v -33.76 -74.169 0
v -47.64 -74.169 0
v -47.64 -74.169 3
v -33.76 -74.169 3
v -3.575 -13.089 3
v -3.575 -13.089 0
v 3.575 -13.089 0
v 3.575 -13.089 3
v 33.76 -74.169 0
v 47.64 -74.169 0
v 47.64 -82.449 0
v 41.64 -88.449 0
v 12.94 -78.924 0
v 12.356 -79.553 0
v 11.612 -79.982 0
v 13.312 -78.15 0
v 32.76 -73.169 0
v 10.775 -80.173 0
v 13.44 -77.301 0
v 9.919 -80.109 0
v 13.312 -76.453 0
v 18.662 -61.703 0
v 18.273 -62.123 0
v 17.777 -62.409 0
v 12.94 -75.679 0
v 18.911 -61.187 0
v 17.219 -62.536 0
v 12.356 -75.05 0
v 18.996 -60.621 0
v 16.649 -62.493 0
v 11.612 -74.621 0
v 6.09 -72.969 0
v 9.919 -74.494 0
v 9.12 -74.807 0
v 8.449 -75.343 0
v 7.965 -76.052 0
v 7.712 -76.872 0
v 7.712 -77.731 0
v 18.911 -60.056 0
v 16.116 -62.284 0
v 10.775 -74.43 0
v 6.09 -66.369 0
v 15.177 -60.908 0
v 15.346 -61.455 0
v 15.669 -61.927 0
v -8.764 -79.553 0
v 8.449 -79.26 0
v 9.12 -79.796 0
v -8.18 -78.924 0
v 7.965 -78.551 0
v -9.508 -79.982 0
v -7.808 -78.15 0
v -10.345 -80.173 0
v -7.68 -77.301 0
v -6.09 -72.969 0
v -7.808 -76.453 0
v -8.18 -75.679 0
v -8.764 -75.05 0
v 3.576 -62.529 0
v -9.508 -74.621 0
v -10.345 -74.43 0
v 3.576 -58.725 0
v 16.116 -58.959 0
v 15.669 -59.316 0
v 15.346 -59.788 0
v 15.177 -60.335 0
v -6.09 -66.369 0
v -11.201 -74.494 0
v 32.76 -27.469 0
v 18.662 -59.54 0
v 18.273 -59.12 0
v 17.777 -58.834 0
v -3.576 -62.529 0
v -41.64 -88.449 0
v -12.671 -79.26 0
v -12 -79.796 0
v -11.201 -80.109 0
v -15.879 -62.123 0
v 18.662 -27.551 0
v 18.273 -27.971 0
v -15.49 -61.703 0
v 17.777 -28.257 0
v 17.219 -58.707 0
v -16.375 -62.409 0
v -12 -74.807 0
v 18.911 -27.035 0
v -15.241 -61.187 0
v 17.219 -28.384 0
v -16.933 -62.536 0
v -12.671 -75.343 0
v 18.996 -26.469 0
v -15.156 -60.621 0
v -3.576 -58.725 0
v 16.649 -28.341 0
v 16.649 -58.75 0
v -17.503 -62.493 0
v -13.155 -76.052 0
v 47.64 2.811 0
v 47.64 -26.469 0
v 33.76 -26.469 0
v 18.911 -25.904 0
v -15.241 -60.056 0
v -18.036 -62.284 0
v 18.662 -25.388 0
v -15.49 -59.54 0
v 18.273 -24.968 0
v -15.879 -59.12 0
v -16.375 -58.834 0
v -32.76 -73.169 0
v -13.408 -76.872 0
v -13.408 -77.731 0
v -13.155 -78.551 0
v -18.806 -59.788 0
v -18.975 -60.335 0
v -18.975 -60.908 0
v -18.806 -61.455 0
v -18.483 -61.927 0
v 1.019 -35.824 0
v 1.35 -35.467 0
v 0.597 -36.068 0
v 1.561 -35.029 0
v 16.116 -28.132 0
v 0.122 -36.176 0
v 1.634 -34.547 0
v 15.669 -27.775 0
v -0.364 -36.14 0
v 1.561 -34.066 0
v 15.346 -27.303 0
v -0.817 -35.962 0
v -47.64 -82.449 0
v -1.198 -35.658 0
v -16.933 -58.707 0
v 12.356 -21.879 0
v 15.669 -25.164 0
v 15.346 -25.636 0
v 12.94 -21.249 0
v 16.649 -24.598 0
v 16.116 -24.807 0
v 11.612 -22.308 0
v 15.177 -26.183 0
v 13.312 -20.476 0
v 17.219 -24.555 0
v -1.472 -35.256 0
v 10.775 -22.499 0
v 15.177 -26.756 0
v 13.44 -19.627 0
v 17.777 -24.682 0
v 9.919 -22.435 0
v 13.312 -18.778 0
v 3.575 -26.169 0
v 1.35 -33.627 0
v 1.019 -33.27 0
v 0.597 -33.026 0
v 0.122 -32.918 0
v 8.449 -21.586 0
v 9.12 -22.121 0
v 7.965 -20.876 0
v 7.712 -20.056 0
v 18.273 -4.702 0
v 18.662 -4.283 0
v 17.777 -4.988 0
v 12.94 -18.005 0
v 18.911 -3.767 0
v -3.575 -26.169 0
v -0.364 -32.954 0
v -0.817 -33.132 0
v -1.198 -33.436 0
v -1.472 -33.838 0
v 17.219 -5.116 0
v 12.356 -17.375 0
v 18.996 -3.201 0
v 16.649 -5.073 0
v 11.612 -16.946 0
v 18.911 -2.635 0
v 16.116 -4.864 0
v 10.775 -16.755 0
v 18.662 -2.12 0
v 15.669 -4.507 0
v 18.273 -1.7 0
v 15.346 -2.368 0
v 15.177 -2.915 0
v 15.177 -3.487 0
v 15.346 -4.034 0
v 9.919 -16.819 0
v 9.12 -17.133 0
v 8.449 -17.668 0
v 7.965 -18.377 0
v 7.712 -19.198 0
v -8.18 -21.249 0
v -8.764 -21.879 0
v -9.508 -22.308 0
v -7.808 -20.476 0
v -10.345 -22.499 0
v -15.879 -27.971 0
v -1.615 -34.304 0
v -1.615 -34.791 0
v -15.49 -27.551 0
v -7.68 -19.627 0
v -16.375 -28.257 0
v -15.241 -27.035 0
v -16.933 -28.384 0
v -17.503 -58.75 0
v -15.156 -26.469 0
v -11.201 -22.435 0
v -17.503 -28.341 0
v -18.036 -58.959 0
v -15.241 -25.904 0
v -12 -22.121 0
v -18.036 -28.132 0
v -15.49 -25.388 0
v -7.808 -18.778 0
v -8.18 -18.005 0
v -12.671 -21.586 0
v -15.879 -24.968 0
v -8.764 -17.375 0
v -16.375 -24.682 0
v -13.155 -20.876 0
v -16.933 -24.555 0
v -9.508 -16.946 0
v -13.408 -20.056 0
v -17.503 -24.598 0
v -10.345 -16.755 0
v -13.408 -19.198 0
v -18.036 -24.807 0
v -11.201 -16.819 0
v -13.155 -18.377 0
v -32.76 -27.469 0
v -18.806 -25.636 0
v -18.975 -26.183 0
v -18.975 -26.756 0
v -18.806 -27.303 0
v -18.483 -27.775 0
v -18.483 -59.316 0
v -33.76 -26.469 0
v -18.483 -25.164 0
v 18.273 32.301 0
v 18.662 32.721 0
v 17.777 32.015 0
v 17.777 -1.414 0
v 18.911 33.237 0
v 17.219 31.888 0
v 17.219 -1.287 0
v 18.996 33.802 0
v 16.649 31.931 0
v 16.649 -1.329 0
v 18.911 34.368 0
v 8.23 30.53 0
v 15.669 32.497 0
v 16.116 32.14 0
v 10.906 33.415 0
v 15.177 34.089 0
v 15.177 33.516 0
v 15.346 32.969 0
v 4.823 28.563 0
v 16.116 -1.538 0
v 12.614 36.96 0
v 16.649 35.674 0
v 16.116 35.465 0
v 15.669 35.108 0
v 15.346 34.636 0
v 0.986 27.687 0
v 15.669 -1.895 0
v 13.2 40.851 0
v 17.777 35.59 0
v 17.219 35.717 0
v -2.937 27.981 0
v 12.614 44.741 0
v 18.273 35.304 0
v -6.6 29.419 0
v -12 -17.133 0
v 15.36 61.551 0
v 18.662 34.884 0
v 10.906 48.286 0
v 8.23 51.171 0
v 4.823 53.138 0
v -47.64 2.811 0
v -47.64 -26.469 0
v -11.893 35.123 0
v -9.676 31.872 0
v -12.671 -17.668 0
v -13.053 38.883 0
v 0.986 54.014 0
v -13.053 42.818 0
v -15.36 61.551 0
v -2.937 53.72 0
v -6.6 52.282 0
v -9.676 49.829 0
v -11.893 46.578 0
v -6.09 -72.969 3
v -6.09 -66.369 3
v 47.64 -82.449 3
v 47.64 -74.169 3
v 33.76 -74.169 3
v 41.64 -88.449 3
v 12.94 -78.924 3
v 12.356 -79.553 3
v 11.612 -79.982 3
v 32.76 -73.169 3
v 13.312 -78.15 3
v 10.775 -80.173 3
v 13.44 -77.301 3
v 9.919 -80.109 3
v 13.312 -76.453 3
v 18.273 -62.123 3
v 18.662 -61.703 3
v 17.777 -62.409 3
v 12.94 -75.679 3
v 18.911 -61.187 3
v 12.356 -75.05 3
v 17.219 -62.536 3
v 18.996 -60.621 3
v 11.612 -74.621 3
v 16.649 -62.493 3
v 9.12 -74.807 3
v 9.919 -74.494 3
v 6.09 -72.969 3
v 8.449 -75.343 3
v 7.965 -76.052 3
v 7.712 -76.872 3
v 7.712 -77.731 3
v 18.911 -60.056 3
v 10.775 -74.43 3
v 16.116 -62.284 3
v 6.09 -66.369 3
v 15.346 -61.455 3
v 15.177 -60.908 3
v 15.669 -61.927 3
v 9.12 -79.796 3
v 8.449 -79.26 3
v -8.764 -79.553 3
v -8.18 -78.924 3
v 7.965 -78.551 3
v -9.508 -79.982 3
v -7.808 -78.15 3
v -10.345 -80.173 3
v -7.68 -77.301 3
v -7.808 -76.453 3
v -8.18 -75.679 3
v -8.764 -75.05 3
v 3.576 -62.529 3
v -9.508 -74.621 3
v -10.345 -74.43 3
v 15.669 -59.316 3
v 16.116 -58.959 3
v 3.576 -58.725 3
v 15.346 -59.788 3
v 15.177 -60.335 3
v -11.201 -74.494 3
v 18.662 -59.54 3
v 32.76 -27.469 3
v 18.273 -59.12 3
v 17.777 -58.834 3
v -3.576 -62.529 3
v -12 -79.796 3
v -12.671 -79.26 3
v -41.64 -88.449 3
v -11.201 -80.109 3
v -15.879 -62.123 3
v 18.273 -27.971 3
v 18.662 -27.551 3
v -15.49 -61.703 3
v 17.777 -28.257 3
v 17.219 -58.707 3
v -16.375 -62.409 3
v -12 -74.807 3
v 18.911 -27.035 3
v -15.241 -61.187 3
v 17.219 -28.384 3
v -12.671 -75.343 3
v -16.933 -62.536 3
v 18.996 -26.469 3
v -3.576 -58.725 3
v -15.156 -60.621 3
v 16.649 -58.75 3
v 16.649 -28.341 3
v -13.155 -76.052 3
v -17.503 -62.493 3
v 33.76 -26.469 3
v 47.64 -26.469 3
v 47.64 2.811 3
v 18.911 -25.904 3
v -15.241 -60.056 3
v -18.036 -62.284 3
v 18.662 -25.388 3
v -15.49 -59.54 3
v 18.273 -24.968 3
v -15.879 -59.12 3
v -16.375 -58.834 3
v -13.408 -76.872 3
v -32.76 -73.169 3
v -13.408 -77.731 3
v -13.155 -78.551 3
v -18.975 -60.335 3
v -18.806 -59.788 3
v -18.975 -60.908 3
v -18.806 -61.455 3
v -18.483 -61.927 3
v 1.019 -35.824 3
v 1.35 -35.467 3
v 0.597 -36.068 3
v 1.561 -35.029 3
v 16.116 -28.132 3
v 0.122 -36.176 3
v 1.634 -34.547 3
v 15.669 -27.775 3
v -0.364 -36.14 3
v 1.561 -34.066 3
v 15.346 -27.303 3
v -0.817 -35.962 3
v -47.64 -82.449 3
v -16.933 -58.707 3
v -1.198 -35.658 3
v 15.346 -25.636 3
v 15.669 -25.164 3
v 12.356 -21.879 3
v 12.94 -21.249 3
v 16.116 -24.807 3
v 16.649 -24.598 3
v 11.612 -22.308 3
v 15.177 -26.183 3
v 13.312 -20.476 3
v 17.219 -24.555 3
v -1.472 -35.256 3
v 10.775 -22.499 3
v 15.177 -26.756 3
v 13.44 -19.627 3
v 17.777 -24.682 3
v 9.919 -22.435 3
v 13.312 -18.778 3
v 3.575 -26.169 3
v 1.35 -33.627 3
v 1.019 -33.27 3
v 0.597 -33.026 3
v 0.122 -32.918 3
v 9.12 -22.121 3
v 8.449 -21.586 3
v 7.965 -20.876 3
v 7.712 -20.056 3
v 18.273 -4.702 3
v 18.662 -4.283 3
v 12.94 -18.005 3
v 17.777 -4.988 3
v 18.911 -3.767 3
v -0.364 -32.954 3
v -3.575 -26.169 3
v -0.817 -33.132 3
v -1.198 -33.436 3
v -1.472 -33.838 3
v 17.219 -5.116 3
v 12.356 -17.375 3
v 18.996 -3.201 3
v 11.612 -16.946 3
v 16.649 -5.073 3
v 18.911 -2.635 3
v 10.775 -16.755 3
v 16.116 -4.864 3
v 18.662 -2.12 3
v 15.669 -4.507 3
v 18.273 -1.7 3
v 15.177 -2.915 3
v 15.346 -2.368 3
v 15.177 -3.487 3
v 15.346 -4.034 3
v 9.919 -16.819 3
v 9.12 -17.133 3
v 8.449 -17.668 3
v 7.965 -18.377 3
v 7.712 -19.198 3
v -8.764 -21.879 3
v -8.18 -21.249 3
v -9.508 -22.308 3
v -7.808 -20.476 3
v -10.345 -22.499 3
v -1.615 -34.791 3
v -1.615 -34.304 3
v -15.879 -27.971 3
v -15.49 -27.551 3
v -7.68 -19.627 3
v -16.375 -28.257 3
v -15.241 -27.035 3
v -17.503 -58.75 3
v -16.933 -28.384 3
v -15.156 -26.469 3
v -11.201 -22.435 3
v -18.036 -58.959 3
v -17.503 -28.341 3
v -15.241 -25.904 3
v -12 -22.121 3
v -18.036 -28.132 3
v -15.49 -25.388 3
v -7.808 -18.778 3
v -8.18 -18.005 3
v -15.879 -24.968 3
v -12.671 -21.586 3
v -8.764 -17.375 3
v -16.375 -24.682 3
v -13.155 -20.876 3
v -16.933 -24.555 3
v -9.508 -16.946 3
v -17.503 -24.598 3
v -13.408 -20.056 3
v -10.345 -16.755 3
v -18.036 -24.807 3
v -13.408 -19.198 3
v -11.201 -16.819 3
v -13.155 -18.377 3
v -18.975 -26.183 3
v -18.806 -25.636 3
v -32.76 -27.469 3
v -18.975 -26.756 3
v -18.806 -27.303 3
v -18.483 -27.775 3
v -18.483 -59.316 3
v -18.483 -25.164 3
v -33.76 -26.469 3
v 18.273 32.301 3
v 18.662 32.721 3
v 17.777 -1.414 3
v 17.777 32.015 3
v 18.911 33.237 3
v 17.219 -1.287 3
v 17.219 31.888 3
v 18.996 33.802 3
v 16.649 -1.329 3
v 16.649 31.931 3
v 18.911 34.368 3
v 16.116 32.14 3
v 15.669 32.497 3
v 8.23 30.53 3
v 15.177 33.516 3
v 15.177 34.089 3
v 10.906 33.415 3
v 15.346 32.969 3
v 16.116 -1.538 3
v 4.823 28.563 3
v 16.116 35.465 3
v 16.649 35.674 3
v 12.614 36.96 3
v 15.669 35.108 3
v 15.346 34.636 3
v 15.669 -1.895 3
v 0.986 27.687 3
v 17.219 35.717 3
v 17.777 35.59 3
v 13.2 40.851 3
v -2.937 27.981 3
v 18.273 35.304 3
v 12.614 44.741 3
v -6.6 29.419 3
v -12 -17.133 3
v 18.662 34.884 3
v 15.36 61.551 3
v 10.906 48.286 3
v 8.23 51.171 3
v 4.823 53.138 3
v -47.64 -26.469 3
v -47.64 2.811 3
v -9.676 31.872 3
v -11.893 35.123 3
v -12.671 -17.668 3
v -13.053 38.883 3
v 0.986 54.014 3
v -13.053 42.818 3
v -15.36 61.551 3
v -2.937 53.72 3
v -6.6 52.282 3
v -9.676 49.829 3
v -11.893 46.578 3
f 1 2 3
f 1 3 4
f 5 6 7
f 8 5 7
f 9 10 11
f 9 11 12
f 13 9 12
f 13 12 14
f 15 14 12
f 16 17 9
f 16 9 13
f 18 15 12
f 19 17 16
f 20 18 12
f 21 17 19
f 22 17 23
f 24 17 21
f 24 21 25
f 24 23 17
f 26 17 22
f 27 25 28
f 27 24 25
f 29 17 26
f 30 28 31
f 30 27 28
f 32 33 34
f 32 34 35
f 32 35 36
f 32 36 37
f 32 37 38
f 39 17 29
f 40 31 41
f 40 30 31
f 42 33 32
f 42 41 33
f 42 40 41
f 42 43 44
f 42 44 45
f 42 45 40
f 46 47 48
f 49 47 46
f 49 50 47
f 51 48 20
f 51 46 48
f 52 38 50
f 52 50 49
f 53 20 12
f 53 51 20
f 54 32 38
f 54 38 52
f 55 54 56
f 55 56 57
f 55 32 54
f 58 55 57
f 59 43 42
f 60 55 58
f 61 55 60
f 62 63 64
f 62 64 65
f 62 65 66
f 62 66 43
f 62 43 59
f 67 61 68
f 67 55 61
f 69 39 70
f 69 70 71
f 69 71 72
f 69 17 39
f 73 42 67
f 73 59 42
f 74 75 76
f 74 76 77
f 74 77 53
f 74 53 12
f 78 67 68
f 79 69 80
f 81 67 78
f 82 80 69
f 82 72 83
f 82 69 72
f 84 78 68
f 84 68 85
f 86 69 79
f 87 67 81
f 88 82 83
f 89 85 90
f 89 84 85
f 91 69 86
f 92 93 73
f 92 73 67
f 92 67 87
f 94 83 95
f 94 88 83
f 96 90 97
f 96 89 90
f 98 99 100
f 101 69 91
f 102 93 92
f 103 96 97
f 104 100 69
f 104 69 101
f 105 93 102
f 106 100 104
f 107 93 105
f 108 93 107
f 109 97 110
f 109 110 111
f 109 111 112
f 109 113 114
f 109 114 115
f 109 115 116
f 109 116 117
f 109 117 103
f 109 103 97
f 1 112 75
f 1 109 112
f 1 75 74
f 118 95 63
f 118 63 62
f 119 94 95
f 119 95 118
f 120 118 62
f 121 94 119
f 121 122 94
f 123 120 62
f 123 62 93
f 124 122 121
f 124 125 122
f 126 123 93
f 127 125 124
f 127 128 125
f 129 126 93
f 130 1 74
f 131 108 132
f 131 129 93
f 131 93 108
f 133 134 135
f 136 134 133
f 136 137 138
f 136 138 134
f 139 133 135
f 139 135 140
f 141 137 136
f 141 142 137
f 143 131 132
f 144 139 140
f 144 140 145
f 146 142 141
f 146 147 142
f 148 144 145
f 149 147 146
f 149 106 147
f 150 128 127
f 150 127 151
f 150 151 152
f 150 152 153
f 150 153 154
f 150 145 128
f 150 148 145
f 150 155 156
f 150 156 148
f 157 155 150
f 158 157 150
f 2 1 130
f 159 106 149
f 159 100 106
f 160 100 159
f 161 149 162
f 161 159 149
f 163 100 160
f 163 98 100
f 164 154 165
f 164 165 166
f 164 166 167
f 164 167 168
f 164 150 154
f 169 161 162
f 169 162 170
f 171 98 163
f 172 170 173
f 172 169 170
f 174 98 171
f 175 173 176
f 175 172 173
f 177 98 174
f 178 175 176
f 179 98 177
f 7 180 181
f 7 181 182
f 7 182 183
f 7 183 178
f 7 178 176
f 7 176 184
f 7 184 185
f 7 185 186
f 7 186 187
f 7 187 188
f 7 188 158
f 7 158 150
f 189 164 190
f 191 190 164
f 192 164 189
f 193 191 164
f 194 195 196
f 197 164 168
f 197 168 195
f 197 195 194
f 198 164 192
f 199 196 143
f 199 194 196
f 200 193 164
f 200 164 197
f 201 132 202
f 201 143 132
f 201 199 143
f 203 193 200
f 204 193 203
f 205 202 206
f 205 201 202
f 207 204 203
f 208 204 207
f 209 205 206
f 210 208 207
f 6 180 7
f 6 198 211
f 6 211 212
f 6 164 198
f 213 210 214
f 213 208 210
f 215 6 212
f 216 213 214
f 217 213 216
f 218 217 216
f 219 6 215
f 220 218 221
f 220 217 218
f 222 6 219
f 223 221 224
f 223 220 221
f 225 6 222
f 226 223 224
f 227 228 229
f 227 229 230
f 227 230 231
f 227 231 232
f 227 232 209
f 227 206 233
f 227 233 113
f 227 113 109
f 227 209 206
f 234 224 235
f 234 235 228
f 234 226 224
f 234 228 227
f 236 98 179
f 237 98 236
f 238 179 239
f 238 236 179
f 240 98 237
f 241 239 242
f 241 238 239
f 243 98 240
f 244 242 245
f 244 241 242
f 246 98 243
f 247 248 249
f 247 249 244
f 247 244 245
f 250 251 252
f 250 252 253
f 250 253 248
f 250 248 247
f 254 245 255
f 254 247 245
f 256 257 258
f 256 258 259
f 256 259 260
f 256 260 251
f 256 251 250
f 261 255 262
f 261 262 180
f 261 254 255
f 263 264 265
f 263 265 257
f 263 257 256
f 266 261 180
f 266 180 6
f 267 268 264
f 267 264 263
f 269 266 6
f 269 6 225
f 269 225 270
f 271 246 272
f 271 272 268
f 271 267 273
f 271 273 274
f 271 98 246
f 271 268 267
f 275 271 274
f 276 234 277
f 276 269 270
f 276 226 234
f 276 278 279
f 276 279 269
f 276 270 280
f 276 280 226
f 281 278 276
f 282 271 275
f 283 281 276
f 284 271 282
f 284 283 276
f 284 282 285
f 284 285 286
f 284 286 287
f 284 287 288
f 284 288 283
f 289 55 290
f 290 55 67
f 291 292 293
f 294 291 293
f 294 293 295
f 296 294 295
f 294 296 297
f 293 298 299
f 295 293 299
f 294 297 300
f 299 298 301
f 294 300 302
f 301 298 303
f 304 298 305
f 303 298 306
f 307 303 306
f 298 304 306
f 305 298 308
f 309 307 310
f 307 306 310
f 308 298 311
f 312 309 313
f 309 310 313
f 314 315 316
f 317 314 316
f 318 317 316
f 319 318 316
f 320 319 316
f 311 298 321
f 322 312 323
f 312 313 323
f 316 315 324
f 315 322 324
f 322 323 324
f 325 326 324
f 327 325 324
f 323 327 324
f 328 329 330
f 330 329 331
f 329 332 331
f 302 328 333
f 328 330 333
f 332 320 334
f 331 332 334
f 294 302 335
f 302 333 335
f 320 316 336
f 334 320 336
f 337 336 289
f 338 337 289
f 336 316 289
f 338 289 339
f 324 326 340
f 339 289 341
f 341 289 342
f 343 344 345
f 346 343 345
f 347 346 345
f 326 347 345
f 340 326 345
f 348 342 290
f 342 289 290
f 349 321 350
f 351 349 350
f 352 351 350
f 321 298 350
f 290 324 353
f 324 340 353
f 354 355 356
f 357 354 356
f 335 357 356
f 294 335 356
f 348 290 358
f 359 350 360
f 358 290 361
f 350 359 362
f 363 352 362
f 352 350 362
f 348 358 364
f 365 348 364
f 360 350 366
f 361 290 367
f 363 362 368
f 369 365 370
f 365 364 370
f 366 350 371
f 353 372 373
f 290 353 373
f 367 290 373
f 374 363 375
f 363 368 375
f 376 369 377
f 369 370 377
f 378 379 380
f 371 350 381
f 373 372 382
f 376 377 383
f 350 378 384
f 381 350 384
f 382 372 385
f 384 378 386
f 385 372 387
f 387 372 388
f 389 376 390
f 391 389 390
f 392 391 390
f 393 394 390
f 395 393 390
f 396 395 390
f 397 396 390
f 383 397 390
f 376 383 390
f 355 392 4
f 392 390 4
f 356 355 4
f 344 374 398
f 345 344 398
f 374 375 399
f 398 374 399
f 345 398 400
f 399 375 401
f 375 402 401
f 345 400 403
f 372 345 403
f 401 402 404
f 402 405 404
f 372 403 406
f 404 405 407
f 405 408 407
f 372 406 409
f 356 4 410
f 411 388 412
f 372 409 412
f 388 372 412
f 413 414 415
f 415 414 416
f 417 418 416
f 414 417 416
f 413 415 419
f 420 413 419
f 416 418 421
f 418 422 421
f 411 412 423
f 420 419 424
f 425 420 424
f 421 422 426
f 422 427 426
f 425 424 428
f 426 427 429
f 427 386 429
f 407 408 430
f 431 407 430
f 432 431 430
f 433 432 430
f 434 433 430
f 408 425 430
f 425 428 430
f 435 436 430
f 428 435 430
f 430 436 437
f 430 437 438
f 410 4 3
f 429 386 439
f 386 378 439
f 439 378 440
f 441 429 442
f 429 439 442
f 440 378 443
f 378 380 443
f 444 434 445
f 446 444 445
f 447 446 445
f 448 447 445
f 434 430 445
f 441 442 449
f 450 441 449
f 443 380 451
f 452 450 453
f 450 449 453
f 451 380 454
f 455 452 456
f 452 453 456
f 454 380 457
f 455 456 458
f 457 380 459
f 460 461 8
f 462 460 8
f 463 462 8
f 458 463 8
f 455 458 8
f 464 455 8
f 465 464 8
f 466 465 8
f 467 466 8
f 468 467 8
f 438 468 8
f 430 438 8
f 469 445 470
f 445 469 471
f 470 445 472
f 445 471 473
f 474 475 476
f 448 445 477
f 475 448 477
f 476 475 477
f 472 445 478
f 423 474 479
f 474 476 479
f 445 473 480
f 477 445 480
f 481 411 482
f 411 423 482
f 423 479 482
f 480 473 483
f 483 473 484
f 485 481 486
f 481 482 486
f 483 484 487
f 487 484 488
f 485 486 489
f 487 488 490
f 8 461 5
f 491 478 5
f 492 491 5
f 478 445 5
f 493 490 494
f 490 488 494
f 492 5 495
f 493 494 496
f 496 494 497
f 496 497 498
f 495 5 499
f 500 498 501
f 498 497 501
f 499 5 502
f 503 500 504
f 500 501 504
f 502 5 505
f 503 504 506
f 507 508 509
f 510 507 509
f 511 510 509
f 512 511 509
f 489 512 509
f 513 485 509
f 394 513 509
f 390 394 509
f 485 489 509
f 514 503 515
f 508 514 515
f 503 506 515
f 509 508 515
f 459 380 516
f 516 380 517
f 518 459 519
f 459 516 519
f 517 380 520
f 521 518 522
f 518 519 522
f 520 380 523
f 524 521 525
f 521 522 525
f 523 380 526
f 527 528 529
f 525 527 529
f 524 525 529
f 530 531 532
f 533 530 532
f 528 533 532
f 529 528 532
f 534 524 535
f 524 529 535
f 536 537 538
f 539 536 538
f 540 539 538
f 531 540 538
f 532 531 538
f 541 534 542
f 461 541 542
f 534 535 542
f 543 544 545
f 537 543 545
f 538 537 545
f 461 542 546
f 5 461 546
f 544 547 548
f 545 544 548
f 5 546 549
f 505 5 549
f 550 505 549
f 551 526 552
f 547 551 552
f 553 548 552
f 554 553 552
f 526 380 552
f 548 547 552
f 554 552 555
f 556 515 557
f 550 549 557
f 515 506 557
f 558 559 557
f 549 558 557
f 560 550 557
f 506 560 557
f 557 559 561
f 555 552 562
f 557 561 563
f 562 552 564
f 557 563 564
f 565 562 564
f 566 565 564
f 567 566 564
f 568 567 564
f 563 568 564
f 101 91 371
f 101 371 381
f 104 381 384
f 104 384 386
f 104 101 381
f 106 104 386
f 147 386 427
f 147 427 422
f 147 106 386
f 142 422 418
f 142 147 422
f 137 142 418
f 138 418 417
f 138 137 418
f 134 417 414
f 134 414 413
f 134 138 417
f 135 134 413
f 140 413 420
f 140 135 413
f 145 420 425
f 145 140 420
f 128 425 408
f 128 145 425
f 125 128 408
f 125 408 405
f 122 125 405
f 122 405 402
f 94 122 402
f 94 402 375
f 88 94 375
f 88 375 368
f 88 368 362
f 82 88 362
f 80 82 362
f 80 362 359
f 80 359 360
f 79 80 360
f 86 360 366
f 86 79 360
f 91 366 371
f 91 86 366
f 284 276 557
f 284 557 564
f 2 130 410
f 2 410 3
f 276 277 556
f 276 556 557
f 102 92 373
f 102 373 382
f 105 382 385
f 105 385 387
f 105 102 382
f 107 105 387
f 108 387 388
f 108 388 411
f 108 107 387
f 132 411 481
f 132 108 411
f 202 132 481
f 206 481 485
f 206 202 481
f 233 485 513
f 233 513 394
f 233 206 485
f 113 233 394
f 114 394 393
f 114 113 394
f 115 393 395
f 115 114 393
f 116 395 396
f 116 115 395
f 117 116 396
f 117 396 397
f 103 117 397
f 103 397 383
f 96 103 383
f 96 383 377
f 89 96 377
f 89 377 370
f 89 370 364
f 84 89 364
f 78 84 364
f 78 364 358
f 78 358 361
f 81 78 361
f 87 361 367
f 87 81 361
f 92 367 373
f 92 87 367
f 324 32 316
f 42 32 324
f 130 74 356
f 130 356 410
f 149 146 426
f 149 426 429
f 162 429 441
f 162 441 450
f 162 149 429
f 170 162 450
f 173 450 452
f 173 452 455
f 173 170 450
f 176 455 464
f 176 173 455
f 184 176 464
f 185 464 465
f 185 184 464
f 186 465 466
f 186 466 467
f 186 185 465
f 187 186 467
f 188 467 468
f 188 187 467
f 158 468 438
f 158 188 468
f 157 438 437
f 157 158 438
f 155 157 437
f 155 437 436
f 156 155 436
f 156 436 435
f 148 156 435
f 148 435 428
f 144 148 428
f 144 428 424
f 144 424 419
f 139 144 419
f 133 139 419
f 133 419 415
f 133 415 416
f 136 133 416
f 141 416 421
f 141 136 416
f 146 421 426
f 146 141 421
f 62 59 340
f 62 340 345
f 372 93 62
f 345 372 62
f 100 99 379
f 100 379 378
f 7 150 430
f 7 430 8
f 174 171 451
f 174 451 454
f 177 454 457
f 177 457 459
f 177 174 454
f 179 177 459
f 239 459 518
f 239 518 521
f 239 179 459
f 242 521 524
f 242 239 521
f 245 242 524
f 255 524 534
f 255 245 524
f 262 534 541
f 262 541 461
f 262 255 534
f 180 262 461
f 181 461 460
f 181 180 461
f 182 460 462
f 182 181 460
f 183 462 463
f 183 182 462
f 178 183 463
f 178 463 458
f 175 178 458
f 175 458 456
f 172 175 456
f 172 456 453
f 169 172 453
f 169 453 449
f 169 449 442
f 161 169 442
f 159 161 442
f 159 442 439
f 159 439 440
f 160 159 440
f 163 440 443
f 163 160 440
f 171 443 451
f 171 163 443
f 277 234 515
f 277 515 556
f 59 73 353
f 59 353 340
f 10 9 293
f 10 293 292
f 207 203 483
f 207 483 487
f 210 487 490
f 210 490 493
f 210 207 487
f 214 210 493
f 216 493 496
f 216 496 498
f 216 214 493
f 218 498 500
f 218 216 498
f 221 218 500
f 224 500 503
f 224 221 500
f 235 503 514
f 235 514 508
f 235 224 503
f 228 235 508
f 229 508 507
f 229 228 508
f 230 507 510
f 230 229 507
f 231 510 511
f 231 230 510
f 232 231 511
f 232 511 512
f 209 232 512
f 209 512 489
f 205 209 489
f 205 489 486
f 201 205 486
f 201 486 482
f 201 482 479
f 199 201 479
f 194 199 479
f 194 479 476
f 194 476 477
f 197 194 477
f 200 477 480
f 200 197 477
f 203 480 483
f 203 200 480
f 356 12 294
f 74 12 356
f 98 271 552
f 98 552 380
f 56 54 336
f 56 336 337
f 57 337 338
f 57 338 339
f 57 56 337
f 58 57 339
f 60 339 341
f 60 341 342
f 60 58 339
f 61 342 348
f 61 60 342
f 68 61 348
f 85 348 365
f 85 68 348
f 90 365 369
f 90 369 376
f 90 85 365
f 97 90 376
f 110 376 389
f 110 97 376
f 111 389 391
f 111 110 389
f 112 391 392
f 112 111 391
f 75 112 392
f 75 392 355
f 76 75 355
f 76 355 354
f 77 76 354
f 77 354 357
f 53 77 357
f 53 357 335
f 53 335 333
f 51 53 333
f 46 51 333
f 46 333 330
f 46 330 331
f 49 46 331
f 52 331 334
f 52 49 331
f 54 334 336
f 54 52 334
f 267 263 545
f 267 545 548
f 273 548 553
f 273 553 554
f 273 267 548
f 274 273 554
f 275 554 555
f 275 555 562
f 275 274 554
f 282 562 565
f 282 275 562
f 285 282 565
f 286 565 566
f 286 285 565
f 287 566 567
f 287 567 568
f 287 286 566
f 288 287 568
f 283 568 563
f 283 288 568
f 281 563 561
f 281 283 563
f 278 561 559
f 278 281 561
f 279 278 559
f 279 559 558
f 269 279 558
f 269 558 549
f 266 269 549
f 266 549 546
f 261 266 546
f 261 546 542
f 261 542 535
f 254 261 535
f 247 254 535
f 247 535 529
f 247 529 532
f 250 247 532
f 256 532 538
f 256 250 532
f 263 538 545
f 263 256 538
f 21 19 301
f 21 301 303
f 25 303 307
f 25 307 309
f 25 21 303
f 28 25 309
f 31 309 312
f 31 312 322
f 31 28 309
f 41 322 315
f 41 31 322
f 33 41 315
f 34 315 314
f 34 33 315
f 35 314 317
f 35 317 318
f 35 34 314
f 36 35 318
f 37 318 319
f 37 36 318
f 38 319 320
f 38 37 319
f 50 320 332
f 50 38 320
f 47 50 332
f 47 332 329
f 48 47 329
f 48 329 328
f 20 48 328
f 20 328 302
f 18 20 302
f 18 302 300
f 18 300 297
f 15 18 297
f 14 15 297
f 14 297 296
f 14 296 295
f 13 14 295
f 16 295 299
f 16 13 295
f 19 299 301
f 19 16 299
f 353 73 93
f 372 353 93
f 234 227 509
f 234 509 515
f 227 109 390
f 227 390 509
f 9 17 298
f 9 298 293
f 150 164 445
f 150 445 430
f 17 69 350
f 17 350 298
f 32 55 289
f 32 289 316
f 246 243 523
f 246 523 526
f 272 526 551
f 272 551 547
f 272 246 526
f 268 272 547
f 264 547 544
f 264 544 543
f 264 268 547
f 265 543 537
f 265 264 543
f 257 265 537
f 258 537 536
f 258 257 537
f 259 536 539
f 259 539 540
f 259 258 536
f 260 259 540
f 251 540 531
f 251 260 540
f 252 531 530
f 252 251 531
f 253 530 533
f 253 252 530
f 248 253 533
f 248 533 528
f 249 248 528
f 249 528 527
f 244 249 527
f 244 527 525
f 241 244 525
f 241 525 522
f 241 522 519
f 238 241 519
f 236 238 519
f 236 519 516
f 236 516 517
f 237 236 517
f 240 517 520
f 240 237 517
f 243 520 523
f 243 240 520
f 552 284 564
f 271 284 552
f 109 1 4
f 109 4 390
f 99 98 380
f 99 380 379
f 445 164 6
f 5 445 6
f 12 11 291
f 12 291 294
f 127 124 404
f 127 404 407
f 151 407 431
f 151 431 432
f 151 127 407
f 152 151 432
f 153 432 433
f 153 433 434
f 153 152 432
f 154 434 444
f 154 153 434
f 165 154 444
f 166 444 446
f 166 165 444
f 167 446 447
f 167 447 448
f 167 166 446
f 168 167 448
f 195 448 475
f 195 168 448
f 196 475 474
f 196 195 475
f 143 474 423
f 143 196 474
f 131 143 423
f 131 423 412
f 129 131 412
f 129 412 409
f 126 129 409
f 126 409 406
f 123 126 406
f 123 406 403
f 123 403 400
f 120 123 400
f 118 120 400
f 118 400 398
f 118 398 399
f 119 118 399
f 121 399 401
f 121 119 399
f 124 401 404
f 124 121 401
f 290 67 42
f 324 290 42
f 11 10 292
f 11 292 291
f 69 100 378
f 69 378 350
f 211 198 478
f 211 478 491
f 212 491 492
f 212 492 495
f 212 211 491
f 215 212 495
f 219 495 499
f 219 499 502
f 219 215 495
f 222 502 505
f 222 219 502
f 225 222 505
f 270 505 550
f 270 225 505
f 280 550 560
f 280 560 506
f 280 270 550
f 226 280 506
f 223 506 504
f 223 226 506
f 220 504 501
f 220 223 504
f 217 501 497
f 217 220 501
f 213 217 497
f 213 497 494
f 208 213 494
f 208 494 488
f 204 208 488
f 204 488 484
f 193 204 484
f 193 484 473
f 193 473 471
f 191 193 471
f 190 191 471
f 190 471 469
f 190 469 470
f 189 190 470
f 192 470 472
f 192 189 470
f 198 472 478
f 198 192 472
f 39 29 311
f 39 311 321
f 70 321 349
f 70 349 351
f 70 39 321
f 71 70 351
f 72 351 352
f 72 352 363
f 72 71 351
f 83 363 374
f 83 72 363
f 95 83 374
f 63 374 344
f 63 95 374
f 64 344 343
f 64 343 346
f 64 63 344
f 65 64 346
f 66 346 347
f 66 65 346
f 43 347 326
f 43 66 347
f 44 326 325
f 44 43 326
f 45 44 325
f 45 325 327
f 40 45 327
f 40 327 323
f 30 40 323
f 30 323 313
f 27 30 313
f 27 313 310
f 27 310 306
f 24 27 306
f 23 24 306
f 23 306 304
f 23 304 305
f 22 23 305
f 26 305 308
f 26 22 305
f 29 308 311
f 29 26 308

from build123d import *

# Parameters (mm, degrees)
ESQUISSE1_R        = 13.2
ESQUISSE1_R_2      = 1.92
ESQUISSE1_R_3      = 2.88
ESQUISSE1_R_4      = 1.63358903
ESQUISSE1_W        = 7.152
ESQUISSE1_H        = 3.804
ESQUISSE1_W_2      = 7.15
ESQUISSE1_H_2      = 13.08
ESQUISSE1_W_3      = 12.18
ESQUISSE1_H_3      = 6.6
BOSS_EXTRU_1_DEPTH = 3


with BuildPart() as part:
    # Esquisse1 → Boss.-Extru.1 (new body)
    with BuildSketch(Plane.XY):
        Polygon((-15.36, 61.550503597), (15.36, 61.550503597), (47.64, 2.810503597), (47.64, -26.469496403), (33.76, -26.469496403), (32.76, -27.469496403), (32.76, -73.169496403), (33.76, -74.169496403), (47.64, -74.169496403), (47.64, -82.449496403), (41.64, -88.449496403), (-41.64, -88.449496403), (-47.64, -82.449496403), (-47.64, -74.169496403), (-33.76, -74.169496403), (-32.76, -73.169496403), (-32.76, -27.469496403), (-33.76, -26.469496403), (-47.64, -26.469496403), (-47.64, 2.810503597), align=None)
        with Locations((0, 40.850503597)):
            Circle(ESQUISSE1_R, mode=Mode.SUBTRACT)
        with Locations((17.076, -26.469496403)):
            Circle(ESQUISSE1_R_2, mode=Mode.SUBTRACT)
        with Locations((17.076, -60.621496403)):
            Circle(ESQUISSE1_R_2, mode=Mode.SUBTRACT)
        with Locations((10.56, -77.301496403)):
            Circle(ESQUISSE1_R_3, mode=Mode.SUBTRACT)
        with Locations((-10.56, -77.301496403)):
            Circle(ESQUISSE1_R_3, mode=Mode.SUBTRACT)
        with Locations((-17.076, -60.621496403)):
            Circle(ESQUISSE1_R_2, mode=Mode.SUBTRACT)
        with Locations((-17.076, -26.469496403)):
            Circle(ESQUISSE1_R_2, mode=Mode.SUBTRACT)
        with Locations((17.076, 33.802499019)):
            Circle(ESQUISSE1_R_2, mode=Mode.SUBTRACT)
        with Locations((17.076, -3.201200519)):
            Circle(ESQUISSE1_R_2, mode=Mode.SUBTRACT)
        with Locations((0, -34.547074796)):
            Circle(ESQUISSE1_R_4, mode=Mode.SUBTRACT)
        with Locations((10.56, -19.626900252)):
            Circle(ESQUISSE1_R_3, mode=Mode.SUBTRACT)
        with Locations((-10.56, -19.626900252)):
            Circle(ESQUISSE1_R_3, mode=Mode.SUBTRACT)
        with Locations((0, -60.627496403)):
            Rectangle(ESQUISSE1_W, ESQUISSE1_H, mode=Mode.SUBTRACT)
        with Locations((0, -19.629496403)):
            Rectangle(ESQUISSE1_W_2, ESQUISSE1_H_2, mode=Mode.SUBTRACT)
        with Locations((0, -69.669496403)):
            Rectangle(ESQUISSE1_W_3, ESQUISSE1_H_3, mode=Mode.SUBTRACT)
    extrude(amount=BOSS_EXTRU_1_DEPTH)


solid = part.part
